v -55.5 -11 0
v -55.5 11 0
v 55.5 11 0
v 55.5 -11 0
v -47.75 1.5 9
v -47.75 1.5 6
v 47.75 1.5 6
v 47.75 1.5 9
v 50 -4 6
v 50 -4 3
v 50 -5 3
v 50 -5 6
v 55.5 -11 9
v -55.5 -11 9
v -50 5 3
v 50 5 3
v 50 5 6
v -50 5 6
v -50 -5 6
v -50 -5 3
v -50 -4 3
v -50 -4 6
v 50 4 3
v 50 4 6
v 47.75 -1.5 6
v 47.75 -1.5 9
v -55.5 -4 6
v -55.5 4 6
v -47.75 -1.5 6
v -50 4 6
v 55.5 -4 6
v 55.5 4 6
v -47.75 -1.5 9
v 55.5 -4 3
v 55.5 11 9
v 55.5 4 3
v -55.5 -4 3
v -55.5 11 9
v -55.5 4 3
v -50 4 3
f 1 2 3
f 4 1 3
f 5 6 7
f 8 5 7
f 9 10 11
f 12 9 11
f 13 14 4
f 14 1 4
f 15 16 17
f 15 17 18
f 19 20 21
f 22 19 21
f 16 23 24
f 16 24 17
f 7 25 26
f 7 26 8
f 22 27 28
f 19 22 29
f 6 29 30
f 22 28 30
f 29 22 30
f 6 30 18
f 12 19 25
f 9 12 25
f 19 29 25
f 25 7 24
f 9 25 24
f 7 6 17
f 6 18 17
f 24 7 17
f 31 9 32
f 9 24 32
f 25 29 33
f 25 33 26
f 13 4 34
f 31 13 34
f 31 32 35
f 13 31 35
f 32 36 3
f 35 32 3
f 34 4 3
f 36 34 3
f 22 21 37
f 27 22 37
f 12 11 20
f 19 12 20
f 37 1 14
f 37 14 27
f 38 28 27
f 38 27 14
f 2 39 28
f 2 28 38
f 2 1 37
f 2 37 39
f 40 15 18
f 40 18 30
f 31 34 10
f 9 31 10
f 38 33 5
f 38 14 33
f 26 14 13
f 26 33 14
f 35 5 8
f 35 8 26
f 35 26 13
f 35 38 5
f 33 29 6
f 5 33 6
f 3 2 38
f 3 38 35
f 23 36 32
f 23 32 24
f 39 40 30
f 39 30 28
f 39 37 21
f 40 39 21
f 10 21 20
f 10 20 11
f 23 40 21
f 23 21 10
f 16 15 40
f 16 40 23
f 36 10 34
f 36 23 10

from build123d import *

# Parameters (mm, degrees)
SKETCH_W      = 111
SKETCH_H      = 22
PAD_DEPTH     = 3
PAD001_DEPTH  = 3
SKETCH002_W   = 111
SKETCH002_H   = 22
SKETCH002_W_2 = 95.5
SKETCH002_H_2 = 3
PAD002_DEPTH  = 3


with BuildPart() as part:
    # Sketch → Pad (new body)
    with BuildSketch(Plane.XY):
        Rectangle(SKETCH_W, SKETCH_H)
    extrude(amount=PAD_DEPTH)

    # Sketch001 (on Face6 of Pad) → Pad001 (join)
    with BuildSketch(Plane.XY.offset(3)):
        Polygon((-55.5, 11), (55.5, 11), (55.5, 4), (50, 4), (50, 5), (-50, 5), (-50, 4), (-55.5, 4), align=None)
        Polygon((-55.5, -11), (55.5, -11), (55.5, -4), (50, -4), (50, -5), (-50, -5), (-50, -4), (-55.5, -4), align=None)
    extrude(amount=PAD001_DEPTH)

    # Sketch002 (on Face12 of Pad001) → Pad002 (join)
    with BuildSketch(Plane.XY.offset(6)):
        Rectangle(SKETCH002_W, SKETCH002_H)
        Rectangle(SKETCH002_W_2, SKETCH002_H_2, mode=Mode.SUBTRACT)
    extrude(amount=PAD002_DEPTH)


solid = part.part
